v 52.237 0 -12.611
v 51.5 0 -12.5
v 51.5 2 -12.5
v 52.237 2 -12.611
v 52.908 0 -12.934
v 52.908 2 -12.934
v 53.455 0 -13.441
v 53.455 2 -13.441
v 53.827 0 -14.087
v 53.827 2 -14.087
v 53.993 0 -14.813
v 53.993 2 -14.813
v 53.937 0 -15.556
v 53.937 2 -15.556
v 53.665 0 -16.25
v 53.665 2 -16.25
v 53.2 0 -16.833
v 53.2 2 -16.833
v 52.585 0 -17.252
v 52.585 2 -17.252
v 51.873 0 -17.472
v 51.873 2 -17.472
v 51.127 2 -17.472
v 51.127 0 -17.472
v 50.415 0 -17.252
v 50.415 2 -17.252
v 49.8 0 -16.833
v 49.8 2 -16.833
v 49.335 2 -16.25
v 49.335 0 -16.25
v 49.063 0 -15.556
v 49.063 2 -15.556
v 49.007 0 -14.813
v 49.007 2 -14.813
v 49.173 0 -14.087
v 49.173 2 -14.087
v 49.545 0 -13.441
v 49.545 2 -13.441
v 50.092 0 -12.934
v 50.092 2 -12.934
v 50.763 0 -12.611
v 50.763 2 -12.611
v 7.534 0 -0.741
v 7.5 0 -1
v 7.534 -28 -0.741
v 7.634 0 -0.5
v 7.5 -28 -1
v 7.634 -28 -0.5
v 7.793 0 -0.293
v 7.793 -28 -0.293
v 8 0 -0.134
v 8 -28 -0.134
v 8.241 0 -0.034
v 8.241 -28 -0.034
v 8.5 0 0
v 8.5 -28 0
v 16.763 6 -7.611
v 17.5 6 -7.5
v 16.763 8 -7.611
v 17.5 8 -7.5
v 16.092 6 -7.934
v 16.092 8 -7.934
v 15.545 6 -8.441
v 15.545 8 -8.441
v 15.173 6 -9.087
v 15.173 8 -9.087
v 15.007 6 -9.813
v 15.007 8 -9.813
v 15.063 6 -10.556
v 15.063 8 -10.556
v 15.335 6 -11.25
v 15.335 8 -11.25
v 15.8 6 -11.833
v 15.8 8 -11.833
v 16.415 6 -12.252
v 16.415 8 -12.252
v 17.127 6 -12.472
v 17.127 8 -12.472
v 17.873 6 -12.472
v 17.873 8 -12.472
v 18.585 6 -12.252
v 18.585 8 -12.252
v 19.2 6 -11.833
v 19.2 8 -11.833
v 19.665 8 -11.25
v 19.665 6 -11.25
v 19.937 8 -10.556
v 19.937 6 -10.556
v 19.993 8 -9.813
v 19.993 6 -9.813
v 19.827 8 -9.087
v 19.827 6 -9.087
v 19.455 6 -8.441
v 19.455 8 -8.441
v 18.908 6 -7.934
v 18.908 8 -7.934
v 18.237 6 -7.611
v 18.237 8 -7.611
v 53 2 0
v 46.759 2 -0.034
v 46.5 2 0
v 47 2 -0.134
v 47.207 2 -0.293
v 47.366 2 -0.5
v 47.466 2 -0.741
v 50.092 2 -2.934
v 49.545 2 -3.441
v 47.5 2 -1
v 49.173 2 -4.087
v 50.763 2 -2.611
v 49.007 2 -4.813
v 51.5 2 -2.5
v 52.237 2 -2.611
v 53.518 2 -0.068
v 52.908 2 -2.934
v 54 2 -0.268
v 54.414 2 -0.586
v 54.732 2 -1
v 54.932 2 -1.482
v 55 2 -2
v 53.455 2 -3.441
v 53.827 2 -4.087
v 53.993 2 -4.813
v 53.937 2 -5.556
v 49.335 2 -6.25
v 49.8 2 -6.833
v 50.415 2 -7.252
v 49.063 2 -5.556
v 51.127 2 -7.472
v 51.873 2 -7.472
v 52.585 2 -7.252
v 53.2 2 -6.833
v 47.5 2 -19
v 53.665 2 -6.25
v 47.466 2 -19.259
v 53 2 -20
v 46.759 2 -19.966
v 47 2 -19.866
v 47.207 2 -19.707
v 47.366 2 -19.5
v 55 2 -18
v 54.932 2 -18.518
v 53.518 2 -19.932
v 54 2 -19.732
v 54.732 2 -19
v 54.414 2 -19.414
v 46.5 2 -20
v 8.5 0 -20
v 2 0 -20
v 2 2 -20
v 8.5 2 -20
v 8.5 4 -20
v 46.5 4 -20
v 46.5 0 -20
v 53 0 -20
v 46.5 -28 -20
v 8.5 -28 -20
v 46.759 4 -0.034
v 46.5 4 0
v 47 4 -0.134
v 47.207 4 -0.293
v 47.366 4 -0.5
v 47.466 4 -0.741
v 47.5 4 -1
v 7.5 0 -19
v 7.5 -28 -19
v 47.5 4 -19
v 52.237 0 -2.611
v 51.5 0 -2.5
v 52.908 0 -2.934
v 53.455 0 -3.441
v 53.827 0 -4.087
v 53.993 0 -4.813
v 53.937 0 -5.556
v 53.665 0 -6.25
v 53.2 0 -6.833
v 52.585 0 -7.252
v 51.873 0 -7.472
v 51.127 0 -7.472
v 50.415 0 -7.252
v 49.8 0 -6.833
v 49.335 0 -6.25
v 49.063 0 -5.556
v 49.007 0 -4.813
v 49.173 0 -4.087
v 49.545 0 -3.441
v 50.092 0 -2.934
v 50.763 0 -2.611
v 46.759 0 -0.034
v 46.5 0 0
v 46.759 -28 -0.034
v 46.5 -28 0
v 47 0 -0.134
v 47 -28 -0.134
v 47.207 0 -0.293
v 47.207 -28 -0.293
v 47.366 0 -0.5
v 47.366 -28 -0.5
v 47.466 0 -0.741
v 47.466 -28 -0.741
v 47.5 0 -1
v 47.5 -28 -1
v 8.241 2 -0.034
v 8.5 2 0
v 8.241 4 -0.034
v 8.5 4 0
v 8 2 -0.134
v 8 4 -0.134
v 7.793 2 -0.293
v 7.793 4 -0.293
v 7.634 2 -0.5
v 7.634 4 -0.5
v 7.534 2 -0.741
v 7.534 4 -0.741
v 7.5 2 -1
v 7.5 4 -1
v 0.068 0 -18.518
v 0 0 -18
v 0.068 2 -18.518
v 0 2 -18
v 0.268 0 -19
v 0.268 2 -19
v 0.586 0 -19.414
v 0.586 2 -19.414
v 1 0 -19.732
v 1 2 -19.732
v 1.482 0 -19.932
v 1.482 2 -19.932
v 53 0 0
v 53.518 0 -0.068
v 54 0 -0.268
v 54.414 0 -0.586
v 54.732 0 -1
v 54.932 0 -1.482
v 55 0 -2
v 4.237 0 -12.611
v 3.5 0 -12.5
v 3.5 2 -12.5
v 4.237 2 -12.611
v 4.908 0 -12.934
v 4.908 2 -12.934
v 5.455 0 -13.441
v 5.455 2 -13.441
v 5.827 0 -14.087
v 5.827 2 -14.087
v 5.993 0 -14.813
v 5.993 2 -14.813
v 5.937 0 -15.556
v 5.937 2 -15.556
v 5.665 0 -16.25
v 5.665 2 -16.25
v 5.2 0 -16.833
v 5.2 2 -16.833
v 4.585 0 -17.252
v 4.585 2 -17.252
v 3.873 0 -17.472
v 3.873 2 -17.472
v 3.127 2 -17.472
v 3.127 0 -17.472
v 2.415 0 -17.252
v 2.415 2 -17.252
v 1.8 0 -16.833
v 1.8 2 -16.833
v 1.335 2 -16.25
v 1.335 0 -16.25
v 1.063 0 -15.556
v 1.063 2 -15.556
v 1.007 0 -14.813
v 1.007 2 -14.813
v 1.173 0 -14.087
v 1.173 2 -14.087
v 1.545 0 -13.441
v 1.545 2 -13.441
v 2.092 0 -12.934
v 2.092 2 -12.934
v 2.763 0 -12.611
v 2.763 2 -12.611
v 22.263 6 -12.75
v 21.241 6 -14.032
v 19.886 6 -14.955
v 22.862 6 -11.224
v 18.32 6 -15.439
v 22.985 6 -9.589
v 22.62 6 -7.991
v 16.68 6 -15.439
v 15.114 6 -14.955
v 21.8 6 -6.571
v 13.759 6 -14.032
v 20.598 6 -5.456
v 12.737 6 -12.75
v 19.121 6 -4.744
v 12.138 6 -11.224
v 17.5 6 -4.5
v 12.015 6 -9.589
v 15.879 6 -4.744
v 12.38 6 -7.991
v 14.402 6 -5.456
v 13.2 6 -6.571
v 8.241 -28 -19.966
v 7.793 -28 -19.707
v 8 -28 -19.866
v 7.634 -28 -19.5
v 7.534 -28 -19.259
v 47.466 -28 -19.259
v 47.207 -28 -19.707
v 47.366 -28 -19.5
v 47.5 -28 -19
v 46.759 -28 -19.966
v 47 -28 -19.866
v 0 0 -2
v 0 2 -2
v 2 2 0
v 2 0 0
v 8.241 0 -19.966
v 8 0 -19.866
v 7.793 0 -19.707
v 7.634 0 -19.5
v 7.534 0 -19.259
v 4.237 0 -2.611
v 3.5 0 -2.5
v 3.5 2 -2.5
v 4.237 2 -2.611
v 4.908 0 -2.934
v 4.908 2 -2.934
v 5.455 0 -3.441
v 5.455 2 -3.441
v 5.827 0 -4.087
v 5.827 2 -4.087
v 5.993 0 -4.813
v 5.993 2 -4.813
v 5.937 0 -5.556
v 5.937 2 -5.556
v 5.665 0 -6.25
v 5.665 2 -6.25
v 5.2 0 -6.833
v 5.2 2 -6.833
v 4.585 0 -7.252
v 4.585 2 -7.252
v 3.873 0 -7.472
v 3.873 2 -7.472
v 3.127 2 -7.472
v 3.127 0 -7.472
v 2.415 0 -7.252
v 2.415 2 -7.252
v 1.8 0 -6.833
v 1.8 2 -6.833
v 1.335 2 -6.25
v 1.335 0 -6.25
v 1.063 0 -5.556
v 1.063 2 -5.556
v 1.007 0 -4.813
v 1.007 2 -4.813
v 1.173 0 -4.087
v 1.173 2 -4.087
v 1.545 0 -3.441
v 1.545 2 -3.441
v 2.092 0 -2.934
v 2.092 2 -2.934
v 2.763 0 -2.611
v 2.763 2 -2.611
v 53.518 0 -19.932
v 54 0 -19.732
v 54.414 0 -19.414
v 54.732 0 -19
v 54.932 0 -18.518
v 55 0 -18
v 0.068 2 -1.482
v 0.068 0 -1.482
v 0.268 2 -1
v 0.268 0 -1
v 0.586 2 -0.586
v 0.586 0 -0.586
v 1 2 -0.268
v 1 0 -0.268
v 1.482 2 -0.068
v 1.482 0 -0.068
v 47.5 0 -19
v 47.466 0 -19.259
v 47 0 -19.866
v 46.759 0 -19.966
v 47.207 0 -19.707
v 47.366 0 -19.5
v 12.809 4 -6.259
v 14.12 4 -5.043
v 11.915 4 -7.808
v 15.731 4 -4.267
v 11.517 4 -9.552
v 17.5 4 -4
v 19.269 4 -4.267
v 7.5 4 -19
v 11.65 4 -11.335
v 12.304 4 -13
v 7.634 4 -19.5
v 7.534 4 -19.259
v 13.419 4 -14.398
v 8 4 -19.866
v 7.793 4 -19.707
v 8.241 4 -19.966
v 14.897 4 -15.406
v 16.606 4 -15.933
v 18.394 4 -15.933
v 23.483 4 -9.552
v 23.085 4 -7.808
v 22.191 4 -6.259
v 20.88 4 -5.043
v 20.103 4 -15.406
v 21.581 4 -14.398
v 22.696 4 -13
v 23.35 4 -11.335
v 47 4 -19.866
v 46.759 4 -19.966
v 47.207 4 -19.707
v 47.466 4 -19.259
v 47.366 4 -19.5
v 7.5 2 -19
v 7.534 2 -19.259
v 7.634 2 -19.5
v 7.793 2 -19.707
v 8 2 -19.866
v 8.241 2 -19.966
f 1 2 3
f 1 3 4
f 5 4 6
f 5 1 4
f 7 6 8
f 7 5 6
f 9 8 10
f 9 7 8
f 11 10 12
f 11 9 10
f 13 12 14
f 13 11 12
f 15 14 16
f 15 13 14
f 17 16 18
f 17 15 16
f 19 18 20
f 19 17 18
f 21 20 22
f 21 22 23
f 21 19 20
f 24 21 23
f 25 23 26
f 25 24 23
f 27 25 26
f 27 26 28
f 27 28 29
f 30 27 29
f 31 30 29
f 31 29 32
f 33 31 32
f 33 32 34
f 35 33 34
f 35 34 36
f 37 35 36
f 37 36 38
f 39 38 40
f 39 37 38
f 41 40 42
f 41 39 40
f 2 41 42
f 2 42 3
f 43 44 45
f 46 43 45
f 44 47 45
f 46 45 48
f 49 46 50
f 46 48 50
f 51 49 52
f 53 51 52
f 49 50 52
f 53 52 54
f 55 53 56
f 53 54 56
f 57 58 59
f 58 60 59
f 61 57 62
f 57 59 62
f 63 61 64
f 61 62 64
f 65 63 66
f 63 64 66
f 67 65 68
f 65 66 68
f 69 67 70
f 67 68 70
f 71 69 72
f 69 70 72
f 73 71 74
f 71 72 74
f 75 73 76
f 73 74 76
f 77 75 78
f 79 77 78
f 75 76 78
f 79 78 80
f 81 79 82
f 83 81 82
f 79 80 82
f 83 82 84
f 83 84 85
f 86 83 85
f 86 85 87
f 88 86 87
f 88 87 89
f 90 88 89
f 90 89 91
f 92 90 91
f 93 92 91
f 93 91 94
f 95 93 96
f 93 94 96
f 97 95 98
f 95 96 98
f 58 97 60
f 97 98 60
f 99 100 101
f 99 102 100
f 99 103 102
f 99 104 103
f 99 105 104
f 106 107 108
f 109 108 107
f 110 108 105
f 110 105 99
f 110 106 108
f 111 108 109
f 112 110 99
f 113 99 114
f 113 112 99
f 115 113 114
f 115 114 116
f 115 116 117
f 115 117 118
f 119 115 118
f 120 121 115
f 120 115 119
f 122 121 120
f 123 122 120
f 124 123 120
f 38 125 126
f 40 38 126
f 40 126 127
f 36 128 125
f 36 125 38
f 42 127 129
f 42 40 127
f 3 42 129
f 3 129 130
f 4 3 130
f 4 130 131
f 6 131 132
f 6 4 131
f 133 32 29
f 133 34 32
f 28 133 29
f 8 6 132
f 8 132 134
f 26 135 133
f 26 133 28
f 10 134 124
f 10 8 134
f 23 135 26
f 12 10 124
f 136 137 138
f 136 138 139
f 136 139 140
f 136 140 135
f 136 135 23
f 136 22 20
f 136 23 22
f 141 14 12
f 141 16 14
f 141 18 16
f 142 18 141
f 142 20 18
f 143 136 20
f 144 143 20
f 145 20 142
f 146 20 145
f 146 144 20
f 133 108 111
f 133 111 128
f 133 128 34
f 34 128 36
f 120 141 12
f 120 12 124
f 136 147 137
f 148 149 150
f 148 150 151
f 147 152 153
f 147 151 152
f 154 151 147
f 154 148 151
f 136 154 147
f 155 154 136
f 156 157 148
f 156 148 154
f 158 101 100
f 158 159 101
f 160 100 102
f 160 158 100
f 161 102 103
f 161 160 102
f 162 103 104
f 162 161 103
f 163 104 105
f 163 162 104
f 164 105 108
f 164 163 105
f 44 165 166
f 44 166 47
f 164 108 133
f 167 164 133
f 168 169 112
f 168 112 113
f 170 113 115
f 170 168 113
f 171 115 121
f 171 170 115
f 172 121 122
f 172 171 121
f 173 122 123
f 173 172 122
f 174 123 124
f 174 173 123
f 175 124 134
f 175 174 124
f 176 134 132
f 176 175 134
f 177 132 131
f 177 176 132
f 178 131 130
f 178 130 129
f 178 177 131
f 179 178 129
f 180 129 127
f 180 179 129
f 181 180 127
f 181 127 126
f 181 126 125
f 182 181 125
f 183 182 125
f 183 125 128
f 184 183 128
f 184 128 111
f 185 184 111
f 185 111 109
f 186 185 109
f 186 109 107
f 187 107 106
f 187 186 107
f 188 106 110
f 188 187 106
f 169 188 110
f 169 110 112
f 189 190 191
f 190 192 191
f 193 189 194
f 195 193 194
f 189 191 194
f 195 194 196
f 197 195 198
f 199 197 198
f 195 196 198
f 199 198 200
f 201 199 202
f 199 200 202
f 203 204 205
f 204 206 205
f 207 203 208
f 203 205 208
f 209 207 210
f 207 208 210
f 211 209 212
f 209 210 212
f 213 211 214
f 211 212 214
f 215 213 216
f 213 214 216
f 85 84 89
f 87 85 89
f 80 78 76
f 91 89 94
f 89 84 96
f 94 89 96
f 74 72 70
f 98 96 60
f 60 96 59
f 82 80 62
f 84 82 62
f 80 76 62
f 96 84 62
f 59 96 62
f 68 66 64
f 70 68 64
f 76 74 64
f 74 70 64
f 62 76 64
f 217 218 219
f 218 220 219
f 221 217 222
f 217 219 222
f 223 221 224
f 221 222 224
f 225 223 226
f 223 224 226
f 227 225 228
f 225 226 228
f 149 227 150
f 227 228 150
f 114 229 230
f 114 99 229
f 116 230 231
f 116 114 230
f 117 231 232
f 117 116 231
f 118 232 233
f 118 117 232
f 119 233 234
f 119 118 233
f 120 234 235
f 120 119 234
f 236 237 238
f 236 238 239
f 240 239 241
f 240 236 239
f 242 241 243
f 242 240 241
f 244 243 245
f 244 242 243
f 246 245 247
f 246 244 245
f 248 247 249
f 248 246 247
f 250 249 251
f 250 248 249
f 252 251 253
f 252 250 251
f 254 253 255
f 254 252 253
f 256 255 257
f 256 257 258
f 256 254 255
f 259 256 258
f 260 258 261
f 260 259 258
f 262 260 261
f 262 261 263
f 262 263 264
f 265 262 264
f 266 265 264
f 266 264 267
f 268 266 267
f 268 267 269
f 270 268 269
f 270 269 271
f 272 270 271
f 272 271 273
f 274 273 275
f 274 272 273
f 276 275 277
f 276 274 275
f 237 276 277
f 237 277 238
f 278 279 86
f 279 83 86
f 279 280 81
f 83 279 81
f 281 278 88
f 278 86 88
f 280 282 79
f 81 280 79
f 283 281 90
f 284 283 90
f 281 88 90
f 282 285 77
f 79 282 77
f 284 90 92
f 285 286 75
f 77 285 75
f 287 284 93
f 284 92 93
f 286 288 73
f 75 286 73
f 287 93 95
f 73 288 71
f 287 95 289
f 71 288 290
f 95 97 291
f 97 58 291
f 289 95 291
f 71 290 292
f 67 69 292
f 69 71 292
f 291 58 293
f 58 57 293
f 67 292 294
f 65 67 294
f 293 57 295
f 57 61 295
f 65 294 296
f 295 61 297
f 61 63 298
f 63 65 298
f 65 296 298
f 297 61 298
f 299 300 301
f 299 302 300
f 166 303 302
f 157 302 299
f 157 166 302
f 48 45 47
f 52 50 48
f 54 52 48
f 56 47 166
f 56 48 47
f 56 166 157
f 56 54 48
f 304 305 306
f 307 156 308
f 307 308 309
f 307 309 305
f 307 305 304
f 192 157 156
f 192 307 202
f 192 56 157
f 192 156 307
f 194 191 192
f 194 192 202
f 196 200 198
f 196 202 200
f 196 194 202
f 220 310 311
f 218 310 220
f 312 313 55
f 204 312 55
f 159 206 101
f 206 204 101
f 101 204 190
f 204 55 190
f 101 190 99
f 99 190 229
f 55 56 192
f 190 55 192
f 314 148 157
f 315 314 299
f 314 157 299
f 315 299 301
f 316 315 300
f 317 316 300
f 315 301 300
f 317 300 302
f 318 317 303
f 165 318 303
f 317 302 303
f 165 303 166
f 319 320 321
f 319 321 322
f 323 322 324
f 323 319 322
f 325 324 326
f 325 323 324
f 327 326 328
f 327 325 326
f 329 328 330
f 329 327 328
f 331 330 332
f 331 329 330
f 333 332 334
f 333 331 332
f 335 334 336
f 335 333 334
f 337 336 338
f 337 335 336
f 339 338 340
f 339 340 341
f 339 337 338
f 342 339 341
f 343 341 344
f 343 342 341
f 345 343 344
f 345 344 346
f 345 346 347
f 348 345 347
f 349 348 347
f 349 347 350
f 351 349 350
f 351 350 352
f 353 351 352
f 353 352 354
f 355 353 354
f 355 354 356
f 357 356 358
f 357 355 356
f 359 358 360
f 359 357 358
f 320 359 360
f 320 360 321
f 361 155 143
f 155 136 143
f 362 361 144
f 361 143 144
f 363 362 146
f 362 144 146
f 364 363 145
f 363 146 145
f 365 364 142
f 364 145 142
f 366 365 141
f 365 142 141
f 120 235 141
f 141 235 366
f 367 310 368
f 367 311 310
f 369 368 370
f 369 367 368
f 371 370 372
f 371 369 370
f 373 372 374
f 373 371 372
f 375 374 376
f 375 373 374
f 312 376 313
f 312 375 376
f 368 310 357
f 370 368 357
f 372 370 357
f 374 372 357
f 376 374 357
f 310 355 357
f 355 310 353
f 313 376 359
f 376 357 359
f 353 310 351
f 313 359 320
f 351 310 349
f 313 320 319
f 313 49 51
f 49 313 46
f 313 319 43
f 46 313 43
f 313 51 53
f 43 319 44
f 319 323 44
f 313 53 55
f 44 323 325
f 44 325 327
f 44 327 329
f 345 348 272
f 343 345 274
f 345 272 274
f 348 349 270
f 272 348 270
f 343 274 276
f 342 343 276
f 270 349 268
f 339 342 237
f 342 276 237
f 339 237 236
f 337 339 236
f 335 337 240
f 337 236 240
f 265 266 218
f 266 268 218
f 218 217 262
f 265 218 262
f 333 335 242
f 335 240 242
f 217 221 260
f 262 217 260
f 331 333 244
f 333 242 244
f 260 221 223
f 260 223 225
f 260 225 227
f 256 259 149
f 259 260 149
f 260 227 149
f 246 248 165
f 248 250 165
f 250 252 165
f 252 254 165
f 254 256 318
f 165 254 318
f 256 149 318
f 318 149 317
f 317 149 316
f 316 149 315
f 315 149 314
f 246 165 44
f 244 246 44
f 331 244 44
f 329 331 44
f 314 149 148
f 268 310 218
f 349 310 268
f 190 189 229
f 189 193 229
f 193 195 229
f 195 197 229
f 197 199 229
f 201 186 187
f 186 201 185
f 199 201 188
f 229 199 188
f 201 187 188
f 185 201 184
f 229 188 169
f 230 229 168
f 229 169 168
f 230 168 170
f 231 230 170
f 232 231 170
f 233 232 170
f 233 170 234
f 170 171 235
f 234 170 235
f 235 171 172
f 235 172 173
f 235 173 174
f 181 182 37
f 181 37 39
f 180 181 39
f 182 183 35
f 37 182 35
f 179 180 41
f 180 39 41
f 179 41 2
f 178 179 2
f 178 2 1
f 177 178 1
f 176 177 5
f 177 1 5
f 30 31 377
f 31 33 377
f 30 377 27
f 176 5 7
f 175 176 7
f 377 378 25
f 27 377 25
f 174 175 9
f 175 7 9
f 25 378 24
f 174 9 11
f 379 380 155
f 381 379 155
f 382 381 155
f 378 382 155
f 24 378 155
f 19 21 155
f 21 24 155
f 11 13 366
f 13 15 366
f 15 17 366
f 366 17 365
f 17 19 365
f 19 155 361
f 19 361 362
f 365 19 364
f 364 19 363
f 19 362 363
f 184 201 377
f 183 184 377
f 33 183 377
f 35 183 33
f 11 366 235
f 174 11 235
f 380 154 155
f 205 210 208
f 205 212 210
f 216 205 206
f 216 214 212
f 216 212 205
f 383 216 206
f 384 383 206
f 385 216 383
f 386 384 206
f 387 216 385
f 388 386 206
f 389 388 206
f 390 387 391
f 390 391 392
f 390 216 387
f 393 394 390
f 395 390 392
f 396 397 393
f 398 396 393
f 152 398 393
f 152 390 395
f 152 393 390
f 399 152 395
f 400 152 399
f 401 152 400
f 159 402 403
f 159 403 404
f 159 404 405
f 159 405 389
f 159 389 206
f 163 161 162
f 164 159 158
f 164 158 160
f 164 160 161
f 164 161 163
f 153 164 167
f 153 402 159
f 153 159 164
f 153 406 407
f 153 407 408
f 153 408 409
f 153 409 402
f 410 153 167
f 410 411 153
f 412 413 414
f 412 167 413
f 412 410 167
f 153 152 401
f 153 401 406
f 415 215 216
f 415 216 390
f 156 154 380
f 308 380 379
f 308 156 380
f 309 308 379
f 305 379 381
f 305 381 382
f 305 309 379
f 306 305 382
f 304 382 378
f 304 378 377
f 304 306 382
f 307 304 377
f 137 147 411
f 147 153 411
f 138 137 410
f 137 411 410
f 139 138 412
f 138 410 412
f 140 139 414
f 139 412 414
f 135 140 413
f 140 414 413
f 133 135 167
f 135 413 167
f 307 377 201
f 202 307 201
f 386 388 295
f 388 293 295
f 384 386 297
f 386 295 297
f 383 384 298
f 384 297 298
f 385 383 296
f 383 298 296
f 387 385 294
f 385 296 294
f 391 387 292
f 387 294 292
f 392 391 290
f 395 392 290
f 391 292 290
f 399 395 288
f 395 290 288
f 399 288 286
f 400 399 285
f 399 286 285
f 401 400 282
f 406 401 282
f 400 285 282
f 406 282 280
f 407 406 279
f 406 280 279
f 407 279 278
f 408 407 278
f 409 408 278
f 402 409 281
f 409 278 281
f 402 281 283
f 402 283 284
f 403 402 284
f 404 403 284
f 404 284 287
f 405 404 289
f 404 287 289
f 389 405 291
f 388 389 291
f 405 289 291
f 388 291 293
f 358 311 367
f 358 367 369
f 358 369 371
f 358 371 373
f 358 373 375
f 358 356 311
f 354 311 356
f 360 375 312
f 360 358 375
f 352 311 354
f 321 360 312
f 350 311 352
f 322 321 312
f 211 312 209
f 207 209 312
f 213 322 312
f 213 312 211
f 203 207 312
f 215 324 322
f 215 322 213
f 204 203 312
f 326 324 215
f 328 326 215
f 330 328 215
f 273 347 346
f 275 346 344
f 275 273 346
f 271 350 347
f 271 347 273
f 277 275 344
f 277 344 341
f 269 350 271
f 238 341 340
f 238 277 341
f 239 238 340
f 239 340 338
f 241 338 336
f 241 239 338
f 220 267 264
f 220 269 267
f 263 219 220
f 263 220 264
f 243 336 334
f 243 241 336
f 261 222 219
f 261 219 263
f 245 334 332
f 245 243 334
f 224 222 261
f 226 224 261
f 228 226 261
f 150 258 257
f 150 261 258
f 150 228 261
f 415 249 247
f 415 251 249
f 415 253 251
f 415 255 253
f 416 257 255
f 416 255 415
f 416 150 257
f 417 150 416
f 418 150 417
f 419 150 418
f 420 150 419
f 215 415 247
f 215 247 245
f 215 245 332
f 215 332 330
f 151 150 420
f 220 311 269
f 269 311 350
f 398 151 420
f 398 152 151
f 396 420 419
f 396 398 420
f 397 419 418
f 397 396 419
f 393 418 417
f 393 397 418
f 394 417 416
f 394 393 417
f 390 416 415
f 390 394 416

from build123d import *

# Parameters (mm, degrees)
SKETCH1_W           = 55
SKETCH1_H           = 20
SKETCH1_R           = 2.5
BOSS_EXTRUDE1_DEPTH = 2
FILLET1_R           = 2
SKETCH2_W           = 40
SKETCH2_H           = 20
BOSS_EXTRUDE2_DEPTH = 28
SKETCH3_W           = 40
SKETCH3_H           = 20
BOSS_EXTRUDE3_DEPTH = 2
FILLET2_R           = 1


with BuildPart() as part:
    # Sketch1 → Boss-Extrude1 (new body)
    with BuildSketch(Plane(origin=(0, 0, 0), x_dir=(1, 0, 0), z_dir=(0, 1, 0))):
        with Locations((27.5, 10)):
            Rectangle(SKETCH1_W, SKETCH1_H)
        with Locations(Location((3.5, 15, 0), (0, 0, 270))):
            Circle(SKETCH1_R, mode=Mode.SUBTRACT)
        with Locations(Location((3.5, 5, 0), (0, 0, 270))):
            Circle(SKETCH1_R, mode=Mode.SUBTRACT)
        with Locations(Location((51.5, 15, 0), (0, 0, 270))):
            Circle(SKETCH1_R, mode=Mode.SUBTRACT)
        with Locations(Location((51.5, 5, 0), (0, 0, 270))):
            Circle(SKETCH1_R, mode=Mode.SUBTRACT)
    extrude(amount=BOSS_EXTRUDE1_DEPTH)

    # Fillet1
    fillet1_edges = [part.edges().sort_by_distance(p)[0] for p in [
        (0, 1, -20),
        (55, 1, -20),
        (55, 1, 0),
        (0, 1, 0),
    ]]
    fillet(fillet1_edges, radius=FILLET1_R)

    # Sketch2 → Boss-Extrude2 (add)
    with BuildSketch(Plane.XZ):
        with Locations((27.5, -10)):
            Rectangle(SKETCH2_W, SKETCH2_H)
    extrude(amount=BOSS_EXTRUDE2_DEPTH)

    # Sketch3 → Boss-Extrude3 (add)
    with BuildSketch(Plane(origin=(0, 2, 0), x_dir=(1, 0, 0), z_dir=(0, 1, 0))):
        with Locations((27.5, 10)):
            Rectangle(SKETCH3_W, SKETCH3_H)
    extrude(amount=BOSS_EXTRUDE3_DEPTH)

    # Fillet2
    fillet2_edges = [part.edges().sort_by_distance(p)[0] for p in [
        (7.5, -14, 0),
        (7.5, -14, -20),
        (47.5, -14, -20),
        (47.5, -14, 0),
        (7.5, 3, -20),
        (7.5, 3, 0),
        (47.5, 3, 0),
        (47.5, 3, -20),
    ]]
    fillet(fillet2_edges, radius=FILLET2_R)

    # Sketch4 → Revolve1 (revolve)
    with BuildSketch(Plane.XY.offset(-10), mode=Mode.PRIVATE) as revolve1_sk:
        Polygon((17.5, 4), (11.5, 4), (12, 6), (15, 6), (15, 8), (17.5, 8), align=None)
    revolve(revolve1_sk.sketch.rotate(Axis((17.5, 8, -10), (0, -1, 0)), 270), axis=Axis((17.5, 8, -10), (0, -1, 0)))


solid = part.part
